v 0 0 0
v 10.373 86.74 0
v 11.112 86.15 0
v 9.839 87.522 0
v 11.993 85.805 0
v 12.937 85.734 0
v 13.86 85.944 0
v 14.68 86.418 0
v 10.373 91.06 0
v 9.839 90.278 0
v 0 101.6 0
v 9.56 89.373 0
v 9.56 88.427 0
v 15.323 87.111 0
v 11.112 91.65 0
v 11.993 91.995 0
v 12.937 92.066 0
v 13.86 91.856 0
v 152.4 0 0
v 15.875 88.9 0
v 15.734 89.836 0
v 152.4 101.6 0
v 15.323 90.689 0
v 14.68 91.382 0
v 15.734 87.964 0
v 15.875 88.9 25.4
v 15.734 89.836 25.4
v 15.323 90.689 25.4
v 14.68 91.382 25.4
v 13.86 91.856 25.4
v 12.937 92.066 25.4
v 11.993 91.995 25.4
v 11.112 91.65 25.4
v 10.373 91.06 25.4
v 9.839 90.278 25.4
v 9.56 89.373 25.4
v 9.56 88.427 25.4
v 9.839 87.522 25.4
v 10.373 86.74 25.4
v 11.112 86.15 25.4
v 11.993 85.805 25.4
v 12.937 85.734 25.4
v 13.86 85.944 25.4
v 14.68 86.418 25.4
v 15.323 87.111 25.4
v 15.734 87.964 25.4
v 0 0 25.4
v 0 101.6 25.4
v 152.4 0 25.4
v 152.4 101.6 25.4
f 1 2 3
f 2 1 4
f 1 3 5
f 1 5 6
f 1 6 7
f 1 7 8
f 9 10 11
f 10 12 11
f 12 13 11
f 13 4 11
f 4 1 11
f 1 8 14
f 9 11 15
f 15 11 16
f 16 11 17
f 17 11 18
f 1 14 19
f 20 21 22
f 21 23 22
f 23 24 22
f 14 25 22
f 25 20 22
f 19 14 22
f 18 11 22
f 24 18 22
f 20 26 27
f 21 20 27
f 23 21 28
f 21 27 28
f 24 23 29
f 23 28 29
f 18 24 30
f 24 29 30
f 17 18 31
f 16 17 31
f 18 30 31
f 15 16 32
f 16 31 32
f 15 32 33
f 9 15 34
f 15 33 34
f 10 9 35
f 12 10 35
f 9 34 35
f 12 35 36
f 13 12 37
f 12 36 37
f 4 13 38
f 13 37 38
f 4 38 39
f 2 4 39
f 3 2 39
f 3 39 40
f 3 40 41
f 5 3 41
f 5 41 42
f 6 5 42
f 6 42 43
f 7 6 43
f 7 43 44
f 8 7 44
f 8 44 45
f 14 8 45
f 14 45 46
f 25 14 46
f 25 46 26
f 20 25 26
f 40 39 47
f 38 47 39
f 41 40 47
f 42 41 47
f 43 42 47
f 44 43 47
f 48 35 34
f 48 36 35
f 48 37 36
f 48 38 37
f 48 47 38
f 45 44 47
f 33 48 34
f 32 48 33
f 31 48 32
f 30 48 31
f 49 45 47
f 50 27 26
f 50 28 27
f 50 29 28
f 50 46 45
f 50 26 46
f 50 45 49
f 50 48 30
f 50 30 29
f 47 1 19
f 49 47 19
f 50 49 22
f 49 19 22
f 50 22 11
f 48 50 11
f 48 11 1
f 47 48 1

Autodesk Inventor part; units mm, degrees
ref_plane "YZ Plane" through (0, 0, 0) normal (1, 0, 0) x (0, 1, 0)
ref_plane "XZ Plane" through (0, 0, 0) normal (0, 1, 0) x (-1, 0, 0)
ref_plane "XY Plane" through (0, 0, 0) normal (0, 0, 1) x (1, 0, 0)
sketch "Sketch1" plane through (0, 0, 0) normal (0, 0, 1) x (1, 0, 0)
  line L0 (0, 0) -> (152.4, 0)
  line L1 (152.4, 0) -> (152.4, 101.6)
  line L2 (152.4, 101.6) -> (0, 101.6)
  line L3 (0, 101.6) -> (0, 0)
  dimension "d0" = 152.4
  dimension "d1" = 101.6
extrude "Extrusion1" add sketch "Sketch1" along normal blind 25.4
sketch "Sketch2" plane through (0, 0, 25.4) normal (0, 0, 1) x (1, 0, 0)
  line L0 (152.4, 101.6) -> (0, 101.6) projected
  line L1 (0, 101.6) -> (0, 0) projected
  circle A0 centre (12.7, 88.9) radius 3.175
  dimension "d4" = 6.35
  dimension "d5" = 12.7
  dimension "d6" = 12.7
extrude "Extrusion2" cut sketch "Sketch2" against normal through all
properties part number "Rectangular pattern"
